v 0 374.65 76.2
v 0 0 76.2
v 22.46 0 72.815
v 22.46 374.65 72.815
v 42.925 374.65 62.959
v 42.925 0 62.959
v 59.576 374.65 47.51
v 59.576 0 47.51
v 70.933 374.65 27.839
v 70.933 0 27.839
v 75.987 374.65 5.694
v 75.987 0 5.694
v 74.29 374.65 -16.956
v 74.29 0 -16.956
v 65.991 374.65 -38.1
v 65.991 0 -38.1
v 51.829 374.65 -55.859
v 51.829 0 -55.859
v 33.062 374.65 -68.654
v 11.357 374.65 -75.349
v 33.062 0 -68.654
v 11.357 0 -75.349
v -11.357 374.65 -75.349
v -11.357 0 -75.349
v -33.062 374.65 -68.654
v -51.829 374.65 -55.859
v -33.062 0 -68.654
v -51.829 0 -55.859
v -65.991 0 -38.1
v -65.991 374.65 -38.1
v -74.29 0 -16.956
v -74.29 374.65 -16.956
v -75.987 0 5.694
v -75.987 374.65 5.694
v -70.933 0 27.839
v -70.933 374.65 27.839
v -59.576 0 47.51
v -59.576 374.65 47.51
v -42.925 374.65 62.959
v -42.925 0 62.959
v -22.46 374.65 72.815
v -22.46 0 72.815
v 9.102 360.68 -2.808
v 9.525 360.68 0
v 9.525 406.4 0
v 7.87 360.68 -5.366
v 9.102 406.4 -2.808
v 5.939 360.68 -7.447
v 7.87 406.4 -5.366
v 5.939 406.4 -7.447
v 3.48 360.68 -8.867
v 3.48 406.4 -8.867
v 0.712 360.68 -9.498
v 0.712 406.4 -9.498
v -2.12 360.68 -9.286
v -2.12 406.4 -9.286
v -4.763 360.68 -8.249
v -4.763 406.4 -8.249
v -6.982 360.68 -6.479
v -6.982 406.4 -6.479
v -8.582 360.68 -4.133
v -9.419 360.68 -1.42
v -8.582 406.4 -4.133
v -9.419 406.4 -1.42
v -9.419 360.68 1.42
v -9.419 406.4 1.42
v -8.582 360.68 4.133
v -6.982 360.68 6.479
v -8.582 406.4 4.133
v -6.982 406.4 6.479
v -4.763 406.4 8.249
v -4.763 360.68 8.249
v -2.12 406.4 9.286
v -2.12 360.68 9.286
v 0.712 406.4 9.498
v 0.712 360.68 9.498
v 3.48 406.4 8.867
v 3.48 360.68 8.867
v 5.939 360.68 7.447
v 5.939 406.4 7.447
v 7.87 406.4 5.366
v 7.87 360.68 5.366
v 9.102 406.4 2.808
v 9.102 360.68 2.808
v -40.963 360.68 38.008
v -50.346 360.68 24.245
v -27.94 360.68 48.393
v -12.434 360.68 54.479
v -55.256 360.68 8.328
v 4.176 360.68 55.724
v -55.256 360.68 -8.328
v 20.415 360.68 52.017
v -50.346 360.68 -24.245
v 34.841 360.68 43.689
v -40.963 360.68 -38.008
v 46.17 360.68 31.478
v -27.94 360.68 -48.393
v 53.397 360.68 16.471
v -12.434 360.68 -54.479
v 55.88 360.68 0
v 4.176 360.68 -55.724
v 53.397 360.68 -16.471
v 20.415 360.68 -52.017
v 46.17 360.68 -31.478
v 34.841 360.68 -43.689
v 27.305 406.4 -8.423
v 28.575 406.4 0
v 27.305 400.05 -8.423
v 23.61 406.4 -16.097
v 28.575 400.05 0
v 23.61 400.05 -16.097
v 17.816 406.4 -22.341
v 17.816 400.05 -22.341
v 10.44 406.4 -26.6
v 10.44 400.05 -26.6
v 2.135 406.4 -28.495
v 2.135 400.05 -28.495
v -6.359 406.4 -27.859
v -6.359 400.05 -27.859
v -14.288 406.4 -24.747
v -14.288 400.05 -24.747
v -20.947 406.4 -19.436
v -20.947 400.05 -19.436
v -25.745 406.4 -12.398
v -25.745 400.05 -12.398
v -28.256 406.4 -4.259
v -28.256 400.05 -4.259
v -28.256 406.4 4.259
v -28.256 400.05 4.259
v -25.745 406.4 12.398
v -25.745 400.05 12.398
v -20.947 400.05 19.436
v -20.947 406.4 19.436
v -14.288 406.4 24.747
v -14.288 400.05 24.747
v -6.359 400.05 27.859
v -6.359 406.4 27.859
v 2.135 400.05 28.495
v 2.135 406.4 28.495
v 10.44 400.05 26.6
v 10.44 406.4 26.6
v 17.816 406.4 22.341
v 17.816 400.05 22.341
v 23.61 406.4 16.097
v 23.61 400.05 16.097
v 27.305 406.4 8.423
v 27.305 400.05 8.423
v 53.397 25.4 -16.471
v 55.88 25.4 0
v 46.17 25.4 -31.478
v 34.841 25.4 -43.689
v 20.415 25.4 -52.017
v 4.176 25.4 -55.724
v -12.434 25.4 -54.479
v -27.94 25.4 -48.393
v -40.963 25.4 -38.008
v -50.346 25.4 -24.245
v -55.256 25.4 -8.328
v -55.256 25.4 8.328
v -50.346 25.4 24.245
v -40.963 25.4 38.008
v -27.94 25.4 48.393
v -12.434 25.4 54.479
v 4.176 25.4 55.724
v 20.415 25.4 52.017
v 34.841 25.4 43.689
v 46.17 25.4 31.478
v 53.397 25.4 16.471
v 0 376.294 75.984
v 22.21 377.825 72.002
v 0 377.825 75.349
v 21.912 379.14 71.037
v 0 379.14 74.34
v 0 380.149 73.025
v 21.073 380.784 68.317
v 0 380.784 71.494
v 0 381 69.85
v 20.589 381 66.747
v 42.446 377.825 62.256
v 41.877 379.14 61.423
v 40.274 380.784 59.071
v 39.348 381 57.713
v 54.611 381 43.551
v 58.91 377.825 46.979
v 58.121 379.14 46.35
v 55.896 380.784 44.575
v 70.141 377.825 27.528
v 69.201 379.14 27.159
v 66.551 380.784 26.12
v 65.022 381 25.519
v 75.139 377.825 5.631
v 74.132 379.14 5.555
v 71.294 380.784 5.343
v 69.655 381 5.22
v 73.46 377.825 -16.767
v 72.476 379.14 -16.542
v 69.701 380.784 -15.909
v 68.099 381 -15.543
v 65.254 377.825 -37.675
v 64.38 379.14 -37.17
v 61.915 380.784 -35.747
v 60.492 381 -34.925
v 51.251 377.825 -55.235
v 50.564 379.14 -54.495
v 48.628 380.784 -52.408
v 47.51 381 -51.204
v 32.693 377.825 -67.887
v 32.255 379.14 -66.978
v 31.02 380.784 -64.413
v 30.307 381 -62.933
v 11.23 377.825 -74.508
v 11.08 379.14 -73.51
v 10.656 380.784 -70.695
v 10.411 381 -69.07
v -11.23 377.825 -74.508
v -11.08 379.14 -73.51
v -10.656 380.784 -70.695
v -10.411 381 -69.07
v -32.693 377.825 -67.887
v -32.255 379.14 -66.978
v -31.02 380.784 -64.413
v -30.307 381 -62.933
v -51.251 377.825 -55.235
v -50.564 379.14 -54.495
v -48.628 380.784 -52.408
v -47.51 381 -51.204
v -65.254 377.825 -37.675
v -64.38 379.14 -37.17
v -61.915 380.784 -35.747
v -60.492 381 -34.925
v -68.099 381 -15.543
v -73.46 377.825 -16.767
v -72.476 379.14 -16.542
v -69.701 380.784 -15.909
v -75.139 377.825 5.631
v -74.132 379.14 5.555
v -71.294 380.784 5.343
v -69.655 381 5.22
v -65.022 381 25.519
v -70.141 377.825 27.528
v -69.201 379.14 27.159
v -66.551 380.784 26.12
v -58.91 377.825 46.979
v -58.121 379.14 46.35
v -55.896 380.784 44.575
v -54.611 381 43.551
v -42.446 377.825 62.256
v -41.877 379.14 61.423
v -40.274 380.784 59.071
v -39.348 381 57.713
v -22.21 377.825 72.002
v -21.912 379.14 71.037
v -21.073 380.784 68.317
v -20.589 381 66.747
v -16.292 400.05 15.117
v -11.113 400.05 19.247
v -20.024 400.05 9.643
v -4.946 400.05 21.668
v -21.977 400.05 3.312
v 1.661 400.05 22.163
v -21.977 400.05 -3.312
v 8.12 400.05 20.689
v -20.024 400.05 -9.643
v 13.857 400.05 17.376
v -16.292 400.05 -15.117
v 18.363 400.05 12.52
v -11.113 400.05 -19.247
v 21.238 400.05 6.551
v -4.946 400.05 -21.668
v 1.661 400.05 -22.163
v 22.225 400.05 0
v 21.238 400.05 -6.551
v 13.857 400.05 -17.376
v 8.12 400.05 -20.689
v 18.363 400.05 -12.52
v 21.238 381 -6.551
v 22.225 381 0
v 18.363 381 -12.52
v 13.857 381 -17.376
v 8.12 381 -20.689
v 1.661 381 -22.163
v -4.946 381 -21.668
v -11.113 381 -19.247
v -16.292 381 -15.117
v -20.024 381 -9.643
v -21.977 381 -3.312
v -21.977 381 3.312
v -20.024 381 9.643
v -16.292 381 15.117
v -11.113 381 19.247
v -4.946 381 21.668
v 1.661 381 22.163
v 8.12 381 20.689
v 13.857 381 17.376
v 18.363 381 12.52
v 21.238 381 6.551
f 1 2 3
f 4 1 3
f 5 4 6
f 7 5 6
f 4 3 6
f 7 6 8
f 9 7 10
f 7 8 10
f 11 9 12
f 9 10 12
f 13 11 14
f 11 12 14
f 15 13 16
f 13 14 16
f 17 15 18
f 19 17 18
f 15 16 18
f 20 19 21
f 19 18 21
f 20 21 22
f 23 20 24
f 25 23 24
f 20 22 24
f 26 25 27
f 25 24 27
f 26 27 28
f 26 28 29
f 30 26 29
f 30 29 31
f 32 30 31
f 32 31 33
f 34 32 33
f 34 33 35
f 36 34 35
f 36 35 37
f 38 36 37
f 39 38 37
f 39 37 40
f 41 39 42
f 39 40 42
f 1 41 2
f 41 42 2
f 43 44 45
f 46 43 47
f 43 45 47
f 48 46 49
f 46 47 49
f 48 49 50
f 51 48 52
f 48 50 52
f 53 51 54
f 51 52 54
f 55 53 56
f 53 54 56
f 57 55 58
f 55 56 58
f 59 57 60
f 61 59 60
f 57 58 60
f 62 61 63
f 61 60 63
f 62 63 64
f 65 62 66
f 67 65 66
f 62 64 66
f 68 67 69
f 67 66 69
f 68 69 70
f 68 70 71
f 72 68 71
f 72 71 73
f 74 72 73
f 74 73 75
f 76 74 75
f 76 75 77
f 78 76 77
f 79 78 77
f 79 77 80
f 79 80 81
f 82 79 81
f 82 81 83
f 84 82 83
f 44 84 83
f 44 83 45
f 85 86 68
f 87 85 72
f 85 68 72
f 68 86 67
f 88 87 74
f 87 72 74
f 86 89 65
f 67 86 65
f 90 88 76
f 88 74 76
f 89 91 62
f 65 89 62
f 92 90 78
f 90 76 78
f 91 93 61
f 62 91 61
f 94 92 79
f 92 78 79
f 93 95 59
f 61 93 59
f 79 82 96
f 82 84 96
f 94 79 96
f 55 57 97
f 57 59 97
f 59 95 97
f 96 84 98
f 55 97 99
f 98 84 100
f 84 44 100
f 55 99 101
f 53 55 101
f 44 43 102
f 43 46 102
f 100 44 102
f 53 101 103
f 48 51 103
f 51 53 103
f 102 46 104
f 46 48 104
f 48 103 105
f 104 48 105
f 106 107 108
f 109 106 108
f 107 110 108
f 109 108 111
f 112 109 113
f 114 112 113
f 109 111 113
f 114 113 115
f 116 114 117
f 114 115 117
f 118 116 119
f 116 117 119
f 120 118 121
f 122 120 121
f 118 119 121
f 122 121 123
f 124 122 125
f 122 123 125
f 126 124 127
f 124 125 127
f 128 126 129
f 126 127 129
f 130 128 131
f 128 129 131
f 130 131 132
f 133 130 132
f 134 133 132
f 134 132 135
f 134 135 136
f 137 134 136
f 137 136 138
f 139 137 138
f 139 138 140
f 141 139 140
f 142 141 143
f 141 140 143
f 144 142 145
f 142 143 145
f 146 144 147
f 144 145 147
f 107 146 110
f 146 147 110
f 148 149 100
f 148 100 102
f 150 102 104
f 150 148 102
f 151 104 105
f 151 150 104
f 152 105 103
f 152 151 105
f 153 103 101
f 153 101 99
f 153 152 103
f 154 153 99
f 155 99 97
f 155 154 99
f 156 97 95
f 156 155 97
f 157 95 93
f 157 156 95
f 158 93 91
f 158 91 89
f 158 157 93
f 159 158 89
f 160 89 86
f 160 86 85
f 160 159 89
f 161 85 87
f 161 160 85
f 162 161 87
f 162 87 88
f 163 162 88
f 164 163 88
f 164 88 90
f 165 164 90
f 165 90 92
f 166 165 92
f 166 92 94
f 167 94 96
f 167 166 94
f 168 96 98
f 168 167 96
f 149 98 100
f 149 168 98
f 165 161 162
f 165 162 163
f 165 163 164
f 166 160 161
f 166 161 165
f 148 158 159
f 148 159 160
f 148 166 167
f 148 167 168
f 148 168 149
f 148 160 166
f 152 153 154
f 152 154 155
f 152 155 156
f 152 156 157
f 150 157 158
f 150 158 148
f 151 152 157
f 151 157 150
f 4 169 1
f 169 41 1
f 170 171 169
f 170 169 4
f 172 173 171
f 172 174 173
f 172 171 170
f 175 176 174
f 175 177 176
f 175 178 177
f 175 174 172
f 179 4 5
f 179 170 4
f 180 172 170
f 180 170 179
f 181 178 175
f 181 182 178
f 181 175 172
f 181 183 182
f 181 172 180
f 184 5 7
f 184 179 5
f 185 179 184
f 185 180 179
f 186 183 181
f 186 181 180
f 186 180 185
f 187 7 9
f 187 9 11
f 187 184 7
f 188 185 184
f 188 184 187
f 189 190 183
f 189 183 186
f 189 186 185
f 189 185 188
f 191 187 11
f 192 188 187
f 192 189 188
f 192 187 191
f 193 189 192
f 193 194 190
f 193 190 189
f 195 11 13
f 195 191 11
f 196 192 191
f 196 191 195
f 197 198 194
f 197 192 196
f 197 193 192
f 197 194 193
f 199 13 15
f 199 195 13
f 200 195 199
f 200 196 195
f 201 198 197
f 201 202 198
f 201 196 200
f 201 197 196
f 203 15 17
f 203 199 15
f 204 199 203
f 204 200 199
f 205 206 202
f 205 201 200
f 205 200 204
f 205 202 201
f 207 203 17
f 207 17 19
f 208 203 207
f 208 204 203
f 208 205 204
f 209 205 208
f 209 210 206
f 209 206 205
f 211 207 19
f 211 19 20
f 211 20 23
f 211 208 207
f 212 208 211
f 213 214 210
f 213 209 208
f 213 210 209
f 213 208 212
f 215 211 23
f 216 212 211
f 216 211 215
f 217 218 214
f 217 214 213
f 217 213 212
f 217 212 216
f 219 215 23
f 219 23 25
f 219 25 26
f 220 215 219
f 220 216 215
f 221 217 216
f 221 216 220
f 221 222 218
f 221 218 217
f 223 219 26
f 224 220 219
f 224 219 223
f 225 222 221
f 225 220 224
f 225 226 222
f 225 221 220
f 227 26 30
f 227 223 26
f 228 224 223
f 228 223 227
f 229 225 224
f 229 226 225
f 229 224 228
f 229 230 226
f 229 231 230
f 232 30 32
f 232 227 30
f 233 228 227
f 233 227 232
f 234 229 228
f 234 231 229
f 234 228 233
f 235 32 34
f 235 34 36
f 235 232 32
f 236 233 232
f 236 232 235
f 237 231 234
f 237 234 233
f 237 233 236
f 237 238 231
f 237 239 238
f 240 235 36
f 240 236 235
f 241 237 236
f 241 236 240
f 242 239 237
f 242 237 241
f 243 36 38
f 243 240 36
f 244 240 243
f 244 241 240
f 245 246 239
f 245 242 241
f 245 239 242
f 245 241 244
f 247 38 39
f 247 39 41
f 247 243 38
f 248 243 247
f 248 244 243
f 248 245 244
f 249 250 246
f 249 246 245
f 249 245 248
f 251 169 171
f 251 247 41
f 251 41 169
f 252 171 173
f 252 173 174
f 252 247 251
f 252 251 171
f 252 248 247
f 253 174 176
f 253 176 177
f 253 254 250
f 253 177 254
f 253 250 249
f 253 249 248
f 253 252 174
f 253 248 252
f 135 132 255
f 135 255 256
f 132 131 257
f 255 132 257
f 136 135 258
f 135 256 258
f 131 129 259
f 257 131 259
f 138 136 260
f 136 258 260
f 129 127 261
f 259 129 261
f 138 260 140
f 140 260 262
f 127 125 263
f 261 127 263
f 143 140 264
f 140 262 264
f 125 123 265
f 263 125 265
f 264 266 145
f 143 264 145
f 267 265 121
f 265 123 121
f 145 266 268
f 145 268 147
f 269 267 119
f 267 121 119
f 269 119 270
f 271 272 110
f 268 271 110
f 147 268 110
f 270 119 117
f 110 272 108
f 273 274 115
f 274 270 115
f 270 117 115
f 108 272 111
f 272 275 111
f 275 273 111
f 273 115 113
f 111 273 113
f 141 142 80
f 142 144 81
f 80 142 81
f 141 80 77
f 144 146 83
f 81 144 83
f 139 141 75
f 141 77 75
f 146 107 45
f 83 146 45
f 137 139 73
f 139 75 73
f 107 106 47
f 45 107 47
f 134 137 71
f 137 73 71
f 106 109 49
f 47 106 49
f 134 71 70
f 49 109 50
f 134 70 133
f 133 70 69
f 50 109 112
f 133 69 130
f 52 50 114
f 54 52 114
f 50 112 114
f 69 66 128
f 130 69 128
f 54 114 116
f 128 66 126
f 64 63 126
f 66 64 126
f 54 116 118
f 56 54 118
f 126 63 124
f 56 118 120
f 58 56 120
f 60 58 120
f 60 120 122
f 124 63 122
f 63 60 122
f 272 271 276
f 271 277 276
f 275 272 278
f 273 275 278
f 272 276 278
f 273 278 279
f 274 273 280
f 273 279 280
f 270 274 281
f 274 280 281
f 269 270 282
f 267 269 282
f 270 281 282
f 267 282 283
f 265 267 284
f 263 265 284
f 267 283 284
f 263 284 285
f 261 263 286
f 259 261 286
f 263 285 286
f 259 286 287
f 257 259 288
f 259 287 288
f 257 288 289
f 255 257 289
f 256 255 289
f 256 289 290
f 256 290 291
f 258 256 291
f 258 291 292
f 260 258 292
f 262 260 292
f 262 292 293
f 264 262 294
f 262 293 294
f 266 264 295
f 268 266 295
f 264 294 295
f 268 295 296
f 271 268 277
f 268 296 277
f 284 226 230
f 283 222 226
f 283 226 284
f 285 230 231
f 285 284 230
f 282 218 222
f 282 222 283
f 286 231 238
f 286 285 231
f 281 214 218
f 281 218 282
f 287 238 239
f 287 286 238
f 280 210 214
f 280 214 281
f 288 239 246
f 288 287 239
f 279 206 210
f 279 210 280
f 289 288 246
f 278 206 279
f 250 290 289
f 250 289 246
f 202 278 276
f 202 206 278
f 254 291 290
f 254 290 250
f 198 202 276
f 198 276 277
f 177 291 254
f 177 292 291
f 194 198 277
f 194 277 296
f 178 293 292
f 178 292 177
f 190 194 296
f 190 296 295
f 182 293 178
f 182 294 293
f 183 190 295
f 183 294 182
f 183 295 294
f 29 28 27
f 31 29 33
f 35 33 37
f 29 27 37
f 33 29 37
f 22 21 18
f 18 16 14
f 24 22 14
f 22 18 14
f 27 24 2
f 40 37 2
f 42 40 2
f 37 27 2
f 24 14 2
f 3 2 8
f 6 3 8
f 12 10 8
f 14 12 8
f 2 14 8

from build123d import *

# Parameters (mm, degrees)
SKETCH1_R           = 76.2
BOSS_EXTRUDE1_DEPTH = 381
FILLET1_R           = 6.35
SHELL4_START        = 25.4
SHELL4_OUTLINE_R    = 55.88
SHELL4_DEPTH        = 335.28
SKETCH3_R           = 9.525
CUT_EXTRUDE1_DEPTH  = 20.32


# Read off the part's stored shape, not the designer's step: Shell4
with BuildPart() as part:
    # Sketch1 → Boss-Extrude1 (new body)
    with BuildSketch(Plane(origin=(0, 0, 0), x_dir=(1, 0, 0), z_dir=(0, 1, 0))):
        with Locations(Location((0, 0, 0), (0, 0, 270))):
            Circle(SKETCH1_R)
    extrude(amount=BOSS_EXTRUDE1_DEPTH)

    # Fillet1
    fillet1_edges = [part.edges().sort_by_distance(p)[0] for p in [
        (0, 381, -76.2),
    ]]
    fillet(fillet1_edges, radius=FILLET1_R)

    # Sketch2 → Revolve1 (revolve)
    with BuildSketch(Plane.XY, mode=Mode.PRIVATE) as revolve1_sk:
        Polygon((-9.525, 381), (-9.525, 406.4), (-28.575, 406.4), (-28.575, 400.05), (-22.225, 400.05), (-22.225, 381), align=None)
    revolve(revolve1_sk.sketch.rotate(Axis((0, -1000, 0), (0, 1, 0)), 180), axis=Axis((0, -1000, 0), (0, 1, 0)))

    # Shell4 outline → Shell4 (cut)
    with BuildSketch(Plane(origin=(0, 0, 0), x_dir=(1, 0, 0), z_dir=(0, 1, 0)).offset(SHELL4_START)):
        Circle(SHELL4_OUTLINE_R)
    extrude(amount=SHELL4_DEPTH, mode=Mode.SUBTRACT)

    # Sketch3 → Cut-Extrude1 (cut)
    with BuildSketch(Plane(origin=(0, 381, 0), x_dir=(1, 0, 0), z_dir=(0, 1, 0))):
        Circle(SKETCH3_R)
    extrude(amount=-CUT_EXTRUDE1_DEPTH, mode=Mode.SUBTRACT)


solid = part.part
